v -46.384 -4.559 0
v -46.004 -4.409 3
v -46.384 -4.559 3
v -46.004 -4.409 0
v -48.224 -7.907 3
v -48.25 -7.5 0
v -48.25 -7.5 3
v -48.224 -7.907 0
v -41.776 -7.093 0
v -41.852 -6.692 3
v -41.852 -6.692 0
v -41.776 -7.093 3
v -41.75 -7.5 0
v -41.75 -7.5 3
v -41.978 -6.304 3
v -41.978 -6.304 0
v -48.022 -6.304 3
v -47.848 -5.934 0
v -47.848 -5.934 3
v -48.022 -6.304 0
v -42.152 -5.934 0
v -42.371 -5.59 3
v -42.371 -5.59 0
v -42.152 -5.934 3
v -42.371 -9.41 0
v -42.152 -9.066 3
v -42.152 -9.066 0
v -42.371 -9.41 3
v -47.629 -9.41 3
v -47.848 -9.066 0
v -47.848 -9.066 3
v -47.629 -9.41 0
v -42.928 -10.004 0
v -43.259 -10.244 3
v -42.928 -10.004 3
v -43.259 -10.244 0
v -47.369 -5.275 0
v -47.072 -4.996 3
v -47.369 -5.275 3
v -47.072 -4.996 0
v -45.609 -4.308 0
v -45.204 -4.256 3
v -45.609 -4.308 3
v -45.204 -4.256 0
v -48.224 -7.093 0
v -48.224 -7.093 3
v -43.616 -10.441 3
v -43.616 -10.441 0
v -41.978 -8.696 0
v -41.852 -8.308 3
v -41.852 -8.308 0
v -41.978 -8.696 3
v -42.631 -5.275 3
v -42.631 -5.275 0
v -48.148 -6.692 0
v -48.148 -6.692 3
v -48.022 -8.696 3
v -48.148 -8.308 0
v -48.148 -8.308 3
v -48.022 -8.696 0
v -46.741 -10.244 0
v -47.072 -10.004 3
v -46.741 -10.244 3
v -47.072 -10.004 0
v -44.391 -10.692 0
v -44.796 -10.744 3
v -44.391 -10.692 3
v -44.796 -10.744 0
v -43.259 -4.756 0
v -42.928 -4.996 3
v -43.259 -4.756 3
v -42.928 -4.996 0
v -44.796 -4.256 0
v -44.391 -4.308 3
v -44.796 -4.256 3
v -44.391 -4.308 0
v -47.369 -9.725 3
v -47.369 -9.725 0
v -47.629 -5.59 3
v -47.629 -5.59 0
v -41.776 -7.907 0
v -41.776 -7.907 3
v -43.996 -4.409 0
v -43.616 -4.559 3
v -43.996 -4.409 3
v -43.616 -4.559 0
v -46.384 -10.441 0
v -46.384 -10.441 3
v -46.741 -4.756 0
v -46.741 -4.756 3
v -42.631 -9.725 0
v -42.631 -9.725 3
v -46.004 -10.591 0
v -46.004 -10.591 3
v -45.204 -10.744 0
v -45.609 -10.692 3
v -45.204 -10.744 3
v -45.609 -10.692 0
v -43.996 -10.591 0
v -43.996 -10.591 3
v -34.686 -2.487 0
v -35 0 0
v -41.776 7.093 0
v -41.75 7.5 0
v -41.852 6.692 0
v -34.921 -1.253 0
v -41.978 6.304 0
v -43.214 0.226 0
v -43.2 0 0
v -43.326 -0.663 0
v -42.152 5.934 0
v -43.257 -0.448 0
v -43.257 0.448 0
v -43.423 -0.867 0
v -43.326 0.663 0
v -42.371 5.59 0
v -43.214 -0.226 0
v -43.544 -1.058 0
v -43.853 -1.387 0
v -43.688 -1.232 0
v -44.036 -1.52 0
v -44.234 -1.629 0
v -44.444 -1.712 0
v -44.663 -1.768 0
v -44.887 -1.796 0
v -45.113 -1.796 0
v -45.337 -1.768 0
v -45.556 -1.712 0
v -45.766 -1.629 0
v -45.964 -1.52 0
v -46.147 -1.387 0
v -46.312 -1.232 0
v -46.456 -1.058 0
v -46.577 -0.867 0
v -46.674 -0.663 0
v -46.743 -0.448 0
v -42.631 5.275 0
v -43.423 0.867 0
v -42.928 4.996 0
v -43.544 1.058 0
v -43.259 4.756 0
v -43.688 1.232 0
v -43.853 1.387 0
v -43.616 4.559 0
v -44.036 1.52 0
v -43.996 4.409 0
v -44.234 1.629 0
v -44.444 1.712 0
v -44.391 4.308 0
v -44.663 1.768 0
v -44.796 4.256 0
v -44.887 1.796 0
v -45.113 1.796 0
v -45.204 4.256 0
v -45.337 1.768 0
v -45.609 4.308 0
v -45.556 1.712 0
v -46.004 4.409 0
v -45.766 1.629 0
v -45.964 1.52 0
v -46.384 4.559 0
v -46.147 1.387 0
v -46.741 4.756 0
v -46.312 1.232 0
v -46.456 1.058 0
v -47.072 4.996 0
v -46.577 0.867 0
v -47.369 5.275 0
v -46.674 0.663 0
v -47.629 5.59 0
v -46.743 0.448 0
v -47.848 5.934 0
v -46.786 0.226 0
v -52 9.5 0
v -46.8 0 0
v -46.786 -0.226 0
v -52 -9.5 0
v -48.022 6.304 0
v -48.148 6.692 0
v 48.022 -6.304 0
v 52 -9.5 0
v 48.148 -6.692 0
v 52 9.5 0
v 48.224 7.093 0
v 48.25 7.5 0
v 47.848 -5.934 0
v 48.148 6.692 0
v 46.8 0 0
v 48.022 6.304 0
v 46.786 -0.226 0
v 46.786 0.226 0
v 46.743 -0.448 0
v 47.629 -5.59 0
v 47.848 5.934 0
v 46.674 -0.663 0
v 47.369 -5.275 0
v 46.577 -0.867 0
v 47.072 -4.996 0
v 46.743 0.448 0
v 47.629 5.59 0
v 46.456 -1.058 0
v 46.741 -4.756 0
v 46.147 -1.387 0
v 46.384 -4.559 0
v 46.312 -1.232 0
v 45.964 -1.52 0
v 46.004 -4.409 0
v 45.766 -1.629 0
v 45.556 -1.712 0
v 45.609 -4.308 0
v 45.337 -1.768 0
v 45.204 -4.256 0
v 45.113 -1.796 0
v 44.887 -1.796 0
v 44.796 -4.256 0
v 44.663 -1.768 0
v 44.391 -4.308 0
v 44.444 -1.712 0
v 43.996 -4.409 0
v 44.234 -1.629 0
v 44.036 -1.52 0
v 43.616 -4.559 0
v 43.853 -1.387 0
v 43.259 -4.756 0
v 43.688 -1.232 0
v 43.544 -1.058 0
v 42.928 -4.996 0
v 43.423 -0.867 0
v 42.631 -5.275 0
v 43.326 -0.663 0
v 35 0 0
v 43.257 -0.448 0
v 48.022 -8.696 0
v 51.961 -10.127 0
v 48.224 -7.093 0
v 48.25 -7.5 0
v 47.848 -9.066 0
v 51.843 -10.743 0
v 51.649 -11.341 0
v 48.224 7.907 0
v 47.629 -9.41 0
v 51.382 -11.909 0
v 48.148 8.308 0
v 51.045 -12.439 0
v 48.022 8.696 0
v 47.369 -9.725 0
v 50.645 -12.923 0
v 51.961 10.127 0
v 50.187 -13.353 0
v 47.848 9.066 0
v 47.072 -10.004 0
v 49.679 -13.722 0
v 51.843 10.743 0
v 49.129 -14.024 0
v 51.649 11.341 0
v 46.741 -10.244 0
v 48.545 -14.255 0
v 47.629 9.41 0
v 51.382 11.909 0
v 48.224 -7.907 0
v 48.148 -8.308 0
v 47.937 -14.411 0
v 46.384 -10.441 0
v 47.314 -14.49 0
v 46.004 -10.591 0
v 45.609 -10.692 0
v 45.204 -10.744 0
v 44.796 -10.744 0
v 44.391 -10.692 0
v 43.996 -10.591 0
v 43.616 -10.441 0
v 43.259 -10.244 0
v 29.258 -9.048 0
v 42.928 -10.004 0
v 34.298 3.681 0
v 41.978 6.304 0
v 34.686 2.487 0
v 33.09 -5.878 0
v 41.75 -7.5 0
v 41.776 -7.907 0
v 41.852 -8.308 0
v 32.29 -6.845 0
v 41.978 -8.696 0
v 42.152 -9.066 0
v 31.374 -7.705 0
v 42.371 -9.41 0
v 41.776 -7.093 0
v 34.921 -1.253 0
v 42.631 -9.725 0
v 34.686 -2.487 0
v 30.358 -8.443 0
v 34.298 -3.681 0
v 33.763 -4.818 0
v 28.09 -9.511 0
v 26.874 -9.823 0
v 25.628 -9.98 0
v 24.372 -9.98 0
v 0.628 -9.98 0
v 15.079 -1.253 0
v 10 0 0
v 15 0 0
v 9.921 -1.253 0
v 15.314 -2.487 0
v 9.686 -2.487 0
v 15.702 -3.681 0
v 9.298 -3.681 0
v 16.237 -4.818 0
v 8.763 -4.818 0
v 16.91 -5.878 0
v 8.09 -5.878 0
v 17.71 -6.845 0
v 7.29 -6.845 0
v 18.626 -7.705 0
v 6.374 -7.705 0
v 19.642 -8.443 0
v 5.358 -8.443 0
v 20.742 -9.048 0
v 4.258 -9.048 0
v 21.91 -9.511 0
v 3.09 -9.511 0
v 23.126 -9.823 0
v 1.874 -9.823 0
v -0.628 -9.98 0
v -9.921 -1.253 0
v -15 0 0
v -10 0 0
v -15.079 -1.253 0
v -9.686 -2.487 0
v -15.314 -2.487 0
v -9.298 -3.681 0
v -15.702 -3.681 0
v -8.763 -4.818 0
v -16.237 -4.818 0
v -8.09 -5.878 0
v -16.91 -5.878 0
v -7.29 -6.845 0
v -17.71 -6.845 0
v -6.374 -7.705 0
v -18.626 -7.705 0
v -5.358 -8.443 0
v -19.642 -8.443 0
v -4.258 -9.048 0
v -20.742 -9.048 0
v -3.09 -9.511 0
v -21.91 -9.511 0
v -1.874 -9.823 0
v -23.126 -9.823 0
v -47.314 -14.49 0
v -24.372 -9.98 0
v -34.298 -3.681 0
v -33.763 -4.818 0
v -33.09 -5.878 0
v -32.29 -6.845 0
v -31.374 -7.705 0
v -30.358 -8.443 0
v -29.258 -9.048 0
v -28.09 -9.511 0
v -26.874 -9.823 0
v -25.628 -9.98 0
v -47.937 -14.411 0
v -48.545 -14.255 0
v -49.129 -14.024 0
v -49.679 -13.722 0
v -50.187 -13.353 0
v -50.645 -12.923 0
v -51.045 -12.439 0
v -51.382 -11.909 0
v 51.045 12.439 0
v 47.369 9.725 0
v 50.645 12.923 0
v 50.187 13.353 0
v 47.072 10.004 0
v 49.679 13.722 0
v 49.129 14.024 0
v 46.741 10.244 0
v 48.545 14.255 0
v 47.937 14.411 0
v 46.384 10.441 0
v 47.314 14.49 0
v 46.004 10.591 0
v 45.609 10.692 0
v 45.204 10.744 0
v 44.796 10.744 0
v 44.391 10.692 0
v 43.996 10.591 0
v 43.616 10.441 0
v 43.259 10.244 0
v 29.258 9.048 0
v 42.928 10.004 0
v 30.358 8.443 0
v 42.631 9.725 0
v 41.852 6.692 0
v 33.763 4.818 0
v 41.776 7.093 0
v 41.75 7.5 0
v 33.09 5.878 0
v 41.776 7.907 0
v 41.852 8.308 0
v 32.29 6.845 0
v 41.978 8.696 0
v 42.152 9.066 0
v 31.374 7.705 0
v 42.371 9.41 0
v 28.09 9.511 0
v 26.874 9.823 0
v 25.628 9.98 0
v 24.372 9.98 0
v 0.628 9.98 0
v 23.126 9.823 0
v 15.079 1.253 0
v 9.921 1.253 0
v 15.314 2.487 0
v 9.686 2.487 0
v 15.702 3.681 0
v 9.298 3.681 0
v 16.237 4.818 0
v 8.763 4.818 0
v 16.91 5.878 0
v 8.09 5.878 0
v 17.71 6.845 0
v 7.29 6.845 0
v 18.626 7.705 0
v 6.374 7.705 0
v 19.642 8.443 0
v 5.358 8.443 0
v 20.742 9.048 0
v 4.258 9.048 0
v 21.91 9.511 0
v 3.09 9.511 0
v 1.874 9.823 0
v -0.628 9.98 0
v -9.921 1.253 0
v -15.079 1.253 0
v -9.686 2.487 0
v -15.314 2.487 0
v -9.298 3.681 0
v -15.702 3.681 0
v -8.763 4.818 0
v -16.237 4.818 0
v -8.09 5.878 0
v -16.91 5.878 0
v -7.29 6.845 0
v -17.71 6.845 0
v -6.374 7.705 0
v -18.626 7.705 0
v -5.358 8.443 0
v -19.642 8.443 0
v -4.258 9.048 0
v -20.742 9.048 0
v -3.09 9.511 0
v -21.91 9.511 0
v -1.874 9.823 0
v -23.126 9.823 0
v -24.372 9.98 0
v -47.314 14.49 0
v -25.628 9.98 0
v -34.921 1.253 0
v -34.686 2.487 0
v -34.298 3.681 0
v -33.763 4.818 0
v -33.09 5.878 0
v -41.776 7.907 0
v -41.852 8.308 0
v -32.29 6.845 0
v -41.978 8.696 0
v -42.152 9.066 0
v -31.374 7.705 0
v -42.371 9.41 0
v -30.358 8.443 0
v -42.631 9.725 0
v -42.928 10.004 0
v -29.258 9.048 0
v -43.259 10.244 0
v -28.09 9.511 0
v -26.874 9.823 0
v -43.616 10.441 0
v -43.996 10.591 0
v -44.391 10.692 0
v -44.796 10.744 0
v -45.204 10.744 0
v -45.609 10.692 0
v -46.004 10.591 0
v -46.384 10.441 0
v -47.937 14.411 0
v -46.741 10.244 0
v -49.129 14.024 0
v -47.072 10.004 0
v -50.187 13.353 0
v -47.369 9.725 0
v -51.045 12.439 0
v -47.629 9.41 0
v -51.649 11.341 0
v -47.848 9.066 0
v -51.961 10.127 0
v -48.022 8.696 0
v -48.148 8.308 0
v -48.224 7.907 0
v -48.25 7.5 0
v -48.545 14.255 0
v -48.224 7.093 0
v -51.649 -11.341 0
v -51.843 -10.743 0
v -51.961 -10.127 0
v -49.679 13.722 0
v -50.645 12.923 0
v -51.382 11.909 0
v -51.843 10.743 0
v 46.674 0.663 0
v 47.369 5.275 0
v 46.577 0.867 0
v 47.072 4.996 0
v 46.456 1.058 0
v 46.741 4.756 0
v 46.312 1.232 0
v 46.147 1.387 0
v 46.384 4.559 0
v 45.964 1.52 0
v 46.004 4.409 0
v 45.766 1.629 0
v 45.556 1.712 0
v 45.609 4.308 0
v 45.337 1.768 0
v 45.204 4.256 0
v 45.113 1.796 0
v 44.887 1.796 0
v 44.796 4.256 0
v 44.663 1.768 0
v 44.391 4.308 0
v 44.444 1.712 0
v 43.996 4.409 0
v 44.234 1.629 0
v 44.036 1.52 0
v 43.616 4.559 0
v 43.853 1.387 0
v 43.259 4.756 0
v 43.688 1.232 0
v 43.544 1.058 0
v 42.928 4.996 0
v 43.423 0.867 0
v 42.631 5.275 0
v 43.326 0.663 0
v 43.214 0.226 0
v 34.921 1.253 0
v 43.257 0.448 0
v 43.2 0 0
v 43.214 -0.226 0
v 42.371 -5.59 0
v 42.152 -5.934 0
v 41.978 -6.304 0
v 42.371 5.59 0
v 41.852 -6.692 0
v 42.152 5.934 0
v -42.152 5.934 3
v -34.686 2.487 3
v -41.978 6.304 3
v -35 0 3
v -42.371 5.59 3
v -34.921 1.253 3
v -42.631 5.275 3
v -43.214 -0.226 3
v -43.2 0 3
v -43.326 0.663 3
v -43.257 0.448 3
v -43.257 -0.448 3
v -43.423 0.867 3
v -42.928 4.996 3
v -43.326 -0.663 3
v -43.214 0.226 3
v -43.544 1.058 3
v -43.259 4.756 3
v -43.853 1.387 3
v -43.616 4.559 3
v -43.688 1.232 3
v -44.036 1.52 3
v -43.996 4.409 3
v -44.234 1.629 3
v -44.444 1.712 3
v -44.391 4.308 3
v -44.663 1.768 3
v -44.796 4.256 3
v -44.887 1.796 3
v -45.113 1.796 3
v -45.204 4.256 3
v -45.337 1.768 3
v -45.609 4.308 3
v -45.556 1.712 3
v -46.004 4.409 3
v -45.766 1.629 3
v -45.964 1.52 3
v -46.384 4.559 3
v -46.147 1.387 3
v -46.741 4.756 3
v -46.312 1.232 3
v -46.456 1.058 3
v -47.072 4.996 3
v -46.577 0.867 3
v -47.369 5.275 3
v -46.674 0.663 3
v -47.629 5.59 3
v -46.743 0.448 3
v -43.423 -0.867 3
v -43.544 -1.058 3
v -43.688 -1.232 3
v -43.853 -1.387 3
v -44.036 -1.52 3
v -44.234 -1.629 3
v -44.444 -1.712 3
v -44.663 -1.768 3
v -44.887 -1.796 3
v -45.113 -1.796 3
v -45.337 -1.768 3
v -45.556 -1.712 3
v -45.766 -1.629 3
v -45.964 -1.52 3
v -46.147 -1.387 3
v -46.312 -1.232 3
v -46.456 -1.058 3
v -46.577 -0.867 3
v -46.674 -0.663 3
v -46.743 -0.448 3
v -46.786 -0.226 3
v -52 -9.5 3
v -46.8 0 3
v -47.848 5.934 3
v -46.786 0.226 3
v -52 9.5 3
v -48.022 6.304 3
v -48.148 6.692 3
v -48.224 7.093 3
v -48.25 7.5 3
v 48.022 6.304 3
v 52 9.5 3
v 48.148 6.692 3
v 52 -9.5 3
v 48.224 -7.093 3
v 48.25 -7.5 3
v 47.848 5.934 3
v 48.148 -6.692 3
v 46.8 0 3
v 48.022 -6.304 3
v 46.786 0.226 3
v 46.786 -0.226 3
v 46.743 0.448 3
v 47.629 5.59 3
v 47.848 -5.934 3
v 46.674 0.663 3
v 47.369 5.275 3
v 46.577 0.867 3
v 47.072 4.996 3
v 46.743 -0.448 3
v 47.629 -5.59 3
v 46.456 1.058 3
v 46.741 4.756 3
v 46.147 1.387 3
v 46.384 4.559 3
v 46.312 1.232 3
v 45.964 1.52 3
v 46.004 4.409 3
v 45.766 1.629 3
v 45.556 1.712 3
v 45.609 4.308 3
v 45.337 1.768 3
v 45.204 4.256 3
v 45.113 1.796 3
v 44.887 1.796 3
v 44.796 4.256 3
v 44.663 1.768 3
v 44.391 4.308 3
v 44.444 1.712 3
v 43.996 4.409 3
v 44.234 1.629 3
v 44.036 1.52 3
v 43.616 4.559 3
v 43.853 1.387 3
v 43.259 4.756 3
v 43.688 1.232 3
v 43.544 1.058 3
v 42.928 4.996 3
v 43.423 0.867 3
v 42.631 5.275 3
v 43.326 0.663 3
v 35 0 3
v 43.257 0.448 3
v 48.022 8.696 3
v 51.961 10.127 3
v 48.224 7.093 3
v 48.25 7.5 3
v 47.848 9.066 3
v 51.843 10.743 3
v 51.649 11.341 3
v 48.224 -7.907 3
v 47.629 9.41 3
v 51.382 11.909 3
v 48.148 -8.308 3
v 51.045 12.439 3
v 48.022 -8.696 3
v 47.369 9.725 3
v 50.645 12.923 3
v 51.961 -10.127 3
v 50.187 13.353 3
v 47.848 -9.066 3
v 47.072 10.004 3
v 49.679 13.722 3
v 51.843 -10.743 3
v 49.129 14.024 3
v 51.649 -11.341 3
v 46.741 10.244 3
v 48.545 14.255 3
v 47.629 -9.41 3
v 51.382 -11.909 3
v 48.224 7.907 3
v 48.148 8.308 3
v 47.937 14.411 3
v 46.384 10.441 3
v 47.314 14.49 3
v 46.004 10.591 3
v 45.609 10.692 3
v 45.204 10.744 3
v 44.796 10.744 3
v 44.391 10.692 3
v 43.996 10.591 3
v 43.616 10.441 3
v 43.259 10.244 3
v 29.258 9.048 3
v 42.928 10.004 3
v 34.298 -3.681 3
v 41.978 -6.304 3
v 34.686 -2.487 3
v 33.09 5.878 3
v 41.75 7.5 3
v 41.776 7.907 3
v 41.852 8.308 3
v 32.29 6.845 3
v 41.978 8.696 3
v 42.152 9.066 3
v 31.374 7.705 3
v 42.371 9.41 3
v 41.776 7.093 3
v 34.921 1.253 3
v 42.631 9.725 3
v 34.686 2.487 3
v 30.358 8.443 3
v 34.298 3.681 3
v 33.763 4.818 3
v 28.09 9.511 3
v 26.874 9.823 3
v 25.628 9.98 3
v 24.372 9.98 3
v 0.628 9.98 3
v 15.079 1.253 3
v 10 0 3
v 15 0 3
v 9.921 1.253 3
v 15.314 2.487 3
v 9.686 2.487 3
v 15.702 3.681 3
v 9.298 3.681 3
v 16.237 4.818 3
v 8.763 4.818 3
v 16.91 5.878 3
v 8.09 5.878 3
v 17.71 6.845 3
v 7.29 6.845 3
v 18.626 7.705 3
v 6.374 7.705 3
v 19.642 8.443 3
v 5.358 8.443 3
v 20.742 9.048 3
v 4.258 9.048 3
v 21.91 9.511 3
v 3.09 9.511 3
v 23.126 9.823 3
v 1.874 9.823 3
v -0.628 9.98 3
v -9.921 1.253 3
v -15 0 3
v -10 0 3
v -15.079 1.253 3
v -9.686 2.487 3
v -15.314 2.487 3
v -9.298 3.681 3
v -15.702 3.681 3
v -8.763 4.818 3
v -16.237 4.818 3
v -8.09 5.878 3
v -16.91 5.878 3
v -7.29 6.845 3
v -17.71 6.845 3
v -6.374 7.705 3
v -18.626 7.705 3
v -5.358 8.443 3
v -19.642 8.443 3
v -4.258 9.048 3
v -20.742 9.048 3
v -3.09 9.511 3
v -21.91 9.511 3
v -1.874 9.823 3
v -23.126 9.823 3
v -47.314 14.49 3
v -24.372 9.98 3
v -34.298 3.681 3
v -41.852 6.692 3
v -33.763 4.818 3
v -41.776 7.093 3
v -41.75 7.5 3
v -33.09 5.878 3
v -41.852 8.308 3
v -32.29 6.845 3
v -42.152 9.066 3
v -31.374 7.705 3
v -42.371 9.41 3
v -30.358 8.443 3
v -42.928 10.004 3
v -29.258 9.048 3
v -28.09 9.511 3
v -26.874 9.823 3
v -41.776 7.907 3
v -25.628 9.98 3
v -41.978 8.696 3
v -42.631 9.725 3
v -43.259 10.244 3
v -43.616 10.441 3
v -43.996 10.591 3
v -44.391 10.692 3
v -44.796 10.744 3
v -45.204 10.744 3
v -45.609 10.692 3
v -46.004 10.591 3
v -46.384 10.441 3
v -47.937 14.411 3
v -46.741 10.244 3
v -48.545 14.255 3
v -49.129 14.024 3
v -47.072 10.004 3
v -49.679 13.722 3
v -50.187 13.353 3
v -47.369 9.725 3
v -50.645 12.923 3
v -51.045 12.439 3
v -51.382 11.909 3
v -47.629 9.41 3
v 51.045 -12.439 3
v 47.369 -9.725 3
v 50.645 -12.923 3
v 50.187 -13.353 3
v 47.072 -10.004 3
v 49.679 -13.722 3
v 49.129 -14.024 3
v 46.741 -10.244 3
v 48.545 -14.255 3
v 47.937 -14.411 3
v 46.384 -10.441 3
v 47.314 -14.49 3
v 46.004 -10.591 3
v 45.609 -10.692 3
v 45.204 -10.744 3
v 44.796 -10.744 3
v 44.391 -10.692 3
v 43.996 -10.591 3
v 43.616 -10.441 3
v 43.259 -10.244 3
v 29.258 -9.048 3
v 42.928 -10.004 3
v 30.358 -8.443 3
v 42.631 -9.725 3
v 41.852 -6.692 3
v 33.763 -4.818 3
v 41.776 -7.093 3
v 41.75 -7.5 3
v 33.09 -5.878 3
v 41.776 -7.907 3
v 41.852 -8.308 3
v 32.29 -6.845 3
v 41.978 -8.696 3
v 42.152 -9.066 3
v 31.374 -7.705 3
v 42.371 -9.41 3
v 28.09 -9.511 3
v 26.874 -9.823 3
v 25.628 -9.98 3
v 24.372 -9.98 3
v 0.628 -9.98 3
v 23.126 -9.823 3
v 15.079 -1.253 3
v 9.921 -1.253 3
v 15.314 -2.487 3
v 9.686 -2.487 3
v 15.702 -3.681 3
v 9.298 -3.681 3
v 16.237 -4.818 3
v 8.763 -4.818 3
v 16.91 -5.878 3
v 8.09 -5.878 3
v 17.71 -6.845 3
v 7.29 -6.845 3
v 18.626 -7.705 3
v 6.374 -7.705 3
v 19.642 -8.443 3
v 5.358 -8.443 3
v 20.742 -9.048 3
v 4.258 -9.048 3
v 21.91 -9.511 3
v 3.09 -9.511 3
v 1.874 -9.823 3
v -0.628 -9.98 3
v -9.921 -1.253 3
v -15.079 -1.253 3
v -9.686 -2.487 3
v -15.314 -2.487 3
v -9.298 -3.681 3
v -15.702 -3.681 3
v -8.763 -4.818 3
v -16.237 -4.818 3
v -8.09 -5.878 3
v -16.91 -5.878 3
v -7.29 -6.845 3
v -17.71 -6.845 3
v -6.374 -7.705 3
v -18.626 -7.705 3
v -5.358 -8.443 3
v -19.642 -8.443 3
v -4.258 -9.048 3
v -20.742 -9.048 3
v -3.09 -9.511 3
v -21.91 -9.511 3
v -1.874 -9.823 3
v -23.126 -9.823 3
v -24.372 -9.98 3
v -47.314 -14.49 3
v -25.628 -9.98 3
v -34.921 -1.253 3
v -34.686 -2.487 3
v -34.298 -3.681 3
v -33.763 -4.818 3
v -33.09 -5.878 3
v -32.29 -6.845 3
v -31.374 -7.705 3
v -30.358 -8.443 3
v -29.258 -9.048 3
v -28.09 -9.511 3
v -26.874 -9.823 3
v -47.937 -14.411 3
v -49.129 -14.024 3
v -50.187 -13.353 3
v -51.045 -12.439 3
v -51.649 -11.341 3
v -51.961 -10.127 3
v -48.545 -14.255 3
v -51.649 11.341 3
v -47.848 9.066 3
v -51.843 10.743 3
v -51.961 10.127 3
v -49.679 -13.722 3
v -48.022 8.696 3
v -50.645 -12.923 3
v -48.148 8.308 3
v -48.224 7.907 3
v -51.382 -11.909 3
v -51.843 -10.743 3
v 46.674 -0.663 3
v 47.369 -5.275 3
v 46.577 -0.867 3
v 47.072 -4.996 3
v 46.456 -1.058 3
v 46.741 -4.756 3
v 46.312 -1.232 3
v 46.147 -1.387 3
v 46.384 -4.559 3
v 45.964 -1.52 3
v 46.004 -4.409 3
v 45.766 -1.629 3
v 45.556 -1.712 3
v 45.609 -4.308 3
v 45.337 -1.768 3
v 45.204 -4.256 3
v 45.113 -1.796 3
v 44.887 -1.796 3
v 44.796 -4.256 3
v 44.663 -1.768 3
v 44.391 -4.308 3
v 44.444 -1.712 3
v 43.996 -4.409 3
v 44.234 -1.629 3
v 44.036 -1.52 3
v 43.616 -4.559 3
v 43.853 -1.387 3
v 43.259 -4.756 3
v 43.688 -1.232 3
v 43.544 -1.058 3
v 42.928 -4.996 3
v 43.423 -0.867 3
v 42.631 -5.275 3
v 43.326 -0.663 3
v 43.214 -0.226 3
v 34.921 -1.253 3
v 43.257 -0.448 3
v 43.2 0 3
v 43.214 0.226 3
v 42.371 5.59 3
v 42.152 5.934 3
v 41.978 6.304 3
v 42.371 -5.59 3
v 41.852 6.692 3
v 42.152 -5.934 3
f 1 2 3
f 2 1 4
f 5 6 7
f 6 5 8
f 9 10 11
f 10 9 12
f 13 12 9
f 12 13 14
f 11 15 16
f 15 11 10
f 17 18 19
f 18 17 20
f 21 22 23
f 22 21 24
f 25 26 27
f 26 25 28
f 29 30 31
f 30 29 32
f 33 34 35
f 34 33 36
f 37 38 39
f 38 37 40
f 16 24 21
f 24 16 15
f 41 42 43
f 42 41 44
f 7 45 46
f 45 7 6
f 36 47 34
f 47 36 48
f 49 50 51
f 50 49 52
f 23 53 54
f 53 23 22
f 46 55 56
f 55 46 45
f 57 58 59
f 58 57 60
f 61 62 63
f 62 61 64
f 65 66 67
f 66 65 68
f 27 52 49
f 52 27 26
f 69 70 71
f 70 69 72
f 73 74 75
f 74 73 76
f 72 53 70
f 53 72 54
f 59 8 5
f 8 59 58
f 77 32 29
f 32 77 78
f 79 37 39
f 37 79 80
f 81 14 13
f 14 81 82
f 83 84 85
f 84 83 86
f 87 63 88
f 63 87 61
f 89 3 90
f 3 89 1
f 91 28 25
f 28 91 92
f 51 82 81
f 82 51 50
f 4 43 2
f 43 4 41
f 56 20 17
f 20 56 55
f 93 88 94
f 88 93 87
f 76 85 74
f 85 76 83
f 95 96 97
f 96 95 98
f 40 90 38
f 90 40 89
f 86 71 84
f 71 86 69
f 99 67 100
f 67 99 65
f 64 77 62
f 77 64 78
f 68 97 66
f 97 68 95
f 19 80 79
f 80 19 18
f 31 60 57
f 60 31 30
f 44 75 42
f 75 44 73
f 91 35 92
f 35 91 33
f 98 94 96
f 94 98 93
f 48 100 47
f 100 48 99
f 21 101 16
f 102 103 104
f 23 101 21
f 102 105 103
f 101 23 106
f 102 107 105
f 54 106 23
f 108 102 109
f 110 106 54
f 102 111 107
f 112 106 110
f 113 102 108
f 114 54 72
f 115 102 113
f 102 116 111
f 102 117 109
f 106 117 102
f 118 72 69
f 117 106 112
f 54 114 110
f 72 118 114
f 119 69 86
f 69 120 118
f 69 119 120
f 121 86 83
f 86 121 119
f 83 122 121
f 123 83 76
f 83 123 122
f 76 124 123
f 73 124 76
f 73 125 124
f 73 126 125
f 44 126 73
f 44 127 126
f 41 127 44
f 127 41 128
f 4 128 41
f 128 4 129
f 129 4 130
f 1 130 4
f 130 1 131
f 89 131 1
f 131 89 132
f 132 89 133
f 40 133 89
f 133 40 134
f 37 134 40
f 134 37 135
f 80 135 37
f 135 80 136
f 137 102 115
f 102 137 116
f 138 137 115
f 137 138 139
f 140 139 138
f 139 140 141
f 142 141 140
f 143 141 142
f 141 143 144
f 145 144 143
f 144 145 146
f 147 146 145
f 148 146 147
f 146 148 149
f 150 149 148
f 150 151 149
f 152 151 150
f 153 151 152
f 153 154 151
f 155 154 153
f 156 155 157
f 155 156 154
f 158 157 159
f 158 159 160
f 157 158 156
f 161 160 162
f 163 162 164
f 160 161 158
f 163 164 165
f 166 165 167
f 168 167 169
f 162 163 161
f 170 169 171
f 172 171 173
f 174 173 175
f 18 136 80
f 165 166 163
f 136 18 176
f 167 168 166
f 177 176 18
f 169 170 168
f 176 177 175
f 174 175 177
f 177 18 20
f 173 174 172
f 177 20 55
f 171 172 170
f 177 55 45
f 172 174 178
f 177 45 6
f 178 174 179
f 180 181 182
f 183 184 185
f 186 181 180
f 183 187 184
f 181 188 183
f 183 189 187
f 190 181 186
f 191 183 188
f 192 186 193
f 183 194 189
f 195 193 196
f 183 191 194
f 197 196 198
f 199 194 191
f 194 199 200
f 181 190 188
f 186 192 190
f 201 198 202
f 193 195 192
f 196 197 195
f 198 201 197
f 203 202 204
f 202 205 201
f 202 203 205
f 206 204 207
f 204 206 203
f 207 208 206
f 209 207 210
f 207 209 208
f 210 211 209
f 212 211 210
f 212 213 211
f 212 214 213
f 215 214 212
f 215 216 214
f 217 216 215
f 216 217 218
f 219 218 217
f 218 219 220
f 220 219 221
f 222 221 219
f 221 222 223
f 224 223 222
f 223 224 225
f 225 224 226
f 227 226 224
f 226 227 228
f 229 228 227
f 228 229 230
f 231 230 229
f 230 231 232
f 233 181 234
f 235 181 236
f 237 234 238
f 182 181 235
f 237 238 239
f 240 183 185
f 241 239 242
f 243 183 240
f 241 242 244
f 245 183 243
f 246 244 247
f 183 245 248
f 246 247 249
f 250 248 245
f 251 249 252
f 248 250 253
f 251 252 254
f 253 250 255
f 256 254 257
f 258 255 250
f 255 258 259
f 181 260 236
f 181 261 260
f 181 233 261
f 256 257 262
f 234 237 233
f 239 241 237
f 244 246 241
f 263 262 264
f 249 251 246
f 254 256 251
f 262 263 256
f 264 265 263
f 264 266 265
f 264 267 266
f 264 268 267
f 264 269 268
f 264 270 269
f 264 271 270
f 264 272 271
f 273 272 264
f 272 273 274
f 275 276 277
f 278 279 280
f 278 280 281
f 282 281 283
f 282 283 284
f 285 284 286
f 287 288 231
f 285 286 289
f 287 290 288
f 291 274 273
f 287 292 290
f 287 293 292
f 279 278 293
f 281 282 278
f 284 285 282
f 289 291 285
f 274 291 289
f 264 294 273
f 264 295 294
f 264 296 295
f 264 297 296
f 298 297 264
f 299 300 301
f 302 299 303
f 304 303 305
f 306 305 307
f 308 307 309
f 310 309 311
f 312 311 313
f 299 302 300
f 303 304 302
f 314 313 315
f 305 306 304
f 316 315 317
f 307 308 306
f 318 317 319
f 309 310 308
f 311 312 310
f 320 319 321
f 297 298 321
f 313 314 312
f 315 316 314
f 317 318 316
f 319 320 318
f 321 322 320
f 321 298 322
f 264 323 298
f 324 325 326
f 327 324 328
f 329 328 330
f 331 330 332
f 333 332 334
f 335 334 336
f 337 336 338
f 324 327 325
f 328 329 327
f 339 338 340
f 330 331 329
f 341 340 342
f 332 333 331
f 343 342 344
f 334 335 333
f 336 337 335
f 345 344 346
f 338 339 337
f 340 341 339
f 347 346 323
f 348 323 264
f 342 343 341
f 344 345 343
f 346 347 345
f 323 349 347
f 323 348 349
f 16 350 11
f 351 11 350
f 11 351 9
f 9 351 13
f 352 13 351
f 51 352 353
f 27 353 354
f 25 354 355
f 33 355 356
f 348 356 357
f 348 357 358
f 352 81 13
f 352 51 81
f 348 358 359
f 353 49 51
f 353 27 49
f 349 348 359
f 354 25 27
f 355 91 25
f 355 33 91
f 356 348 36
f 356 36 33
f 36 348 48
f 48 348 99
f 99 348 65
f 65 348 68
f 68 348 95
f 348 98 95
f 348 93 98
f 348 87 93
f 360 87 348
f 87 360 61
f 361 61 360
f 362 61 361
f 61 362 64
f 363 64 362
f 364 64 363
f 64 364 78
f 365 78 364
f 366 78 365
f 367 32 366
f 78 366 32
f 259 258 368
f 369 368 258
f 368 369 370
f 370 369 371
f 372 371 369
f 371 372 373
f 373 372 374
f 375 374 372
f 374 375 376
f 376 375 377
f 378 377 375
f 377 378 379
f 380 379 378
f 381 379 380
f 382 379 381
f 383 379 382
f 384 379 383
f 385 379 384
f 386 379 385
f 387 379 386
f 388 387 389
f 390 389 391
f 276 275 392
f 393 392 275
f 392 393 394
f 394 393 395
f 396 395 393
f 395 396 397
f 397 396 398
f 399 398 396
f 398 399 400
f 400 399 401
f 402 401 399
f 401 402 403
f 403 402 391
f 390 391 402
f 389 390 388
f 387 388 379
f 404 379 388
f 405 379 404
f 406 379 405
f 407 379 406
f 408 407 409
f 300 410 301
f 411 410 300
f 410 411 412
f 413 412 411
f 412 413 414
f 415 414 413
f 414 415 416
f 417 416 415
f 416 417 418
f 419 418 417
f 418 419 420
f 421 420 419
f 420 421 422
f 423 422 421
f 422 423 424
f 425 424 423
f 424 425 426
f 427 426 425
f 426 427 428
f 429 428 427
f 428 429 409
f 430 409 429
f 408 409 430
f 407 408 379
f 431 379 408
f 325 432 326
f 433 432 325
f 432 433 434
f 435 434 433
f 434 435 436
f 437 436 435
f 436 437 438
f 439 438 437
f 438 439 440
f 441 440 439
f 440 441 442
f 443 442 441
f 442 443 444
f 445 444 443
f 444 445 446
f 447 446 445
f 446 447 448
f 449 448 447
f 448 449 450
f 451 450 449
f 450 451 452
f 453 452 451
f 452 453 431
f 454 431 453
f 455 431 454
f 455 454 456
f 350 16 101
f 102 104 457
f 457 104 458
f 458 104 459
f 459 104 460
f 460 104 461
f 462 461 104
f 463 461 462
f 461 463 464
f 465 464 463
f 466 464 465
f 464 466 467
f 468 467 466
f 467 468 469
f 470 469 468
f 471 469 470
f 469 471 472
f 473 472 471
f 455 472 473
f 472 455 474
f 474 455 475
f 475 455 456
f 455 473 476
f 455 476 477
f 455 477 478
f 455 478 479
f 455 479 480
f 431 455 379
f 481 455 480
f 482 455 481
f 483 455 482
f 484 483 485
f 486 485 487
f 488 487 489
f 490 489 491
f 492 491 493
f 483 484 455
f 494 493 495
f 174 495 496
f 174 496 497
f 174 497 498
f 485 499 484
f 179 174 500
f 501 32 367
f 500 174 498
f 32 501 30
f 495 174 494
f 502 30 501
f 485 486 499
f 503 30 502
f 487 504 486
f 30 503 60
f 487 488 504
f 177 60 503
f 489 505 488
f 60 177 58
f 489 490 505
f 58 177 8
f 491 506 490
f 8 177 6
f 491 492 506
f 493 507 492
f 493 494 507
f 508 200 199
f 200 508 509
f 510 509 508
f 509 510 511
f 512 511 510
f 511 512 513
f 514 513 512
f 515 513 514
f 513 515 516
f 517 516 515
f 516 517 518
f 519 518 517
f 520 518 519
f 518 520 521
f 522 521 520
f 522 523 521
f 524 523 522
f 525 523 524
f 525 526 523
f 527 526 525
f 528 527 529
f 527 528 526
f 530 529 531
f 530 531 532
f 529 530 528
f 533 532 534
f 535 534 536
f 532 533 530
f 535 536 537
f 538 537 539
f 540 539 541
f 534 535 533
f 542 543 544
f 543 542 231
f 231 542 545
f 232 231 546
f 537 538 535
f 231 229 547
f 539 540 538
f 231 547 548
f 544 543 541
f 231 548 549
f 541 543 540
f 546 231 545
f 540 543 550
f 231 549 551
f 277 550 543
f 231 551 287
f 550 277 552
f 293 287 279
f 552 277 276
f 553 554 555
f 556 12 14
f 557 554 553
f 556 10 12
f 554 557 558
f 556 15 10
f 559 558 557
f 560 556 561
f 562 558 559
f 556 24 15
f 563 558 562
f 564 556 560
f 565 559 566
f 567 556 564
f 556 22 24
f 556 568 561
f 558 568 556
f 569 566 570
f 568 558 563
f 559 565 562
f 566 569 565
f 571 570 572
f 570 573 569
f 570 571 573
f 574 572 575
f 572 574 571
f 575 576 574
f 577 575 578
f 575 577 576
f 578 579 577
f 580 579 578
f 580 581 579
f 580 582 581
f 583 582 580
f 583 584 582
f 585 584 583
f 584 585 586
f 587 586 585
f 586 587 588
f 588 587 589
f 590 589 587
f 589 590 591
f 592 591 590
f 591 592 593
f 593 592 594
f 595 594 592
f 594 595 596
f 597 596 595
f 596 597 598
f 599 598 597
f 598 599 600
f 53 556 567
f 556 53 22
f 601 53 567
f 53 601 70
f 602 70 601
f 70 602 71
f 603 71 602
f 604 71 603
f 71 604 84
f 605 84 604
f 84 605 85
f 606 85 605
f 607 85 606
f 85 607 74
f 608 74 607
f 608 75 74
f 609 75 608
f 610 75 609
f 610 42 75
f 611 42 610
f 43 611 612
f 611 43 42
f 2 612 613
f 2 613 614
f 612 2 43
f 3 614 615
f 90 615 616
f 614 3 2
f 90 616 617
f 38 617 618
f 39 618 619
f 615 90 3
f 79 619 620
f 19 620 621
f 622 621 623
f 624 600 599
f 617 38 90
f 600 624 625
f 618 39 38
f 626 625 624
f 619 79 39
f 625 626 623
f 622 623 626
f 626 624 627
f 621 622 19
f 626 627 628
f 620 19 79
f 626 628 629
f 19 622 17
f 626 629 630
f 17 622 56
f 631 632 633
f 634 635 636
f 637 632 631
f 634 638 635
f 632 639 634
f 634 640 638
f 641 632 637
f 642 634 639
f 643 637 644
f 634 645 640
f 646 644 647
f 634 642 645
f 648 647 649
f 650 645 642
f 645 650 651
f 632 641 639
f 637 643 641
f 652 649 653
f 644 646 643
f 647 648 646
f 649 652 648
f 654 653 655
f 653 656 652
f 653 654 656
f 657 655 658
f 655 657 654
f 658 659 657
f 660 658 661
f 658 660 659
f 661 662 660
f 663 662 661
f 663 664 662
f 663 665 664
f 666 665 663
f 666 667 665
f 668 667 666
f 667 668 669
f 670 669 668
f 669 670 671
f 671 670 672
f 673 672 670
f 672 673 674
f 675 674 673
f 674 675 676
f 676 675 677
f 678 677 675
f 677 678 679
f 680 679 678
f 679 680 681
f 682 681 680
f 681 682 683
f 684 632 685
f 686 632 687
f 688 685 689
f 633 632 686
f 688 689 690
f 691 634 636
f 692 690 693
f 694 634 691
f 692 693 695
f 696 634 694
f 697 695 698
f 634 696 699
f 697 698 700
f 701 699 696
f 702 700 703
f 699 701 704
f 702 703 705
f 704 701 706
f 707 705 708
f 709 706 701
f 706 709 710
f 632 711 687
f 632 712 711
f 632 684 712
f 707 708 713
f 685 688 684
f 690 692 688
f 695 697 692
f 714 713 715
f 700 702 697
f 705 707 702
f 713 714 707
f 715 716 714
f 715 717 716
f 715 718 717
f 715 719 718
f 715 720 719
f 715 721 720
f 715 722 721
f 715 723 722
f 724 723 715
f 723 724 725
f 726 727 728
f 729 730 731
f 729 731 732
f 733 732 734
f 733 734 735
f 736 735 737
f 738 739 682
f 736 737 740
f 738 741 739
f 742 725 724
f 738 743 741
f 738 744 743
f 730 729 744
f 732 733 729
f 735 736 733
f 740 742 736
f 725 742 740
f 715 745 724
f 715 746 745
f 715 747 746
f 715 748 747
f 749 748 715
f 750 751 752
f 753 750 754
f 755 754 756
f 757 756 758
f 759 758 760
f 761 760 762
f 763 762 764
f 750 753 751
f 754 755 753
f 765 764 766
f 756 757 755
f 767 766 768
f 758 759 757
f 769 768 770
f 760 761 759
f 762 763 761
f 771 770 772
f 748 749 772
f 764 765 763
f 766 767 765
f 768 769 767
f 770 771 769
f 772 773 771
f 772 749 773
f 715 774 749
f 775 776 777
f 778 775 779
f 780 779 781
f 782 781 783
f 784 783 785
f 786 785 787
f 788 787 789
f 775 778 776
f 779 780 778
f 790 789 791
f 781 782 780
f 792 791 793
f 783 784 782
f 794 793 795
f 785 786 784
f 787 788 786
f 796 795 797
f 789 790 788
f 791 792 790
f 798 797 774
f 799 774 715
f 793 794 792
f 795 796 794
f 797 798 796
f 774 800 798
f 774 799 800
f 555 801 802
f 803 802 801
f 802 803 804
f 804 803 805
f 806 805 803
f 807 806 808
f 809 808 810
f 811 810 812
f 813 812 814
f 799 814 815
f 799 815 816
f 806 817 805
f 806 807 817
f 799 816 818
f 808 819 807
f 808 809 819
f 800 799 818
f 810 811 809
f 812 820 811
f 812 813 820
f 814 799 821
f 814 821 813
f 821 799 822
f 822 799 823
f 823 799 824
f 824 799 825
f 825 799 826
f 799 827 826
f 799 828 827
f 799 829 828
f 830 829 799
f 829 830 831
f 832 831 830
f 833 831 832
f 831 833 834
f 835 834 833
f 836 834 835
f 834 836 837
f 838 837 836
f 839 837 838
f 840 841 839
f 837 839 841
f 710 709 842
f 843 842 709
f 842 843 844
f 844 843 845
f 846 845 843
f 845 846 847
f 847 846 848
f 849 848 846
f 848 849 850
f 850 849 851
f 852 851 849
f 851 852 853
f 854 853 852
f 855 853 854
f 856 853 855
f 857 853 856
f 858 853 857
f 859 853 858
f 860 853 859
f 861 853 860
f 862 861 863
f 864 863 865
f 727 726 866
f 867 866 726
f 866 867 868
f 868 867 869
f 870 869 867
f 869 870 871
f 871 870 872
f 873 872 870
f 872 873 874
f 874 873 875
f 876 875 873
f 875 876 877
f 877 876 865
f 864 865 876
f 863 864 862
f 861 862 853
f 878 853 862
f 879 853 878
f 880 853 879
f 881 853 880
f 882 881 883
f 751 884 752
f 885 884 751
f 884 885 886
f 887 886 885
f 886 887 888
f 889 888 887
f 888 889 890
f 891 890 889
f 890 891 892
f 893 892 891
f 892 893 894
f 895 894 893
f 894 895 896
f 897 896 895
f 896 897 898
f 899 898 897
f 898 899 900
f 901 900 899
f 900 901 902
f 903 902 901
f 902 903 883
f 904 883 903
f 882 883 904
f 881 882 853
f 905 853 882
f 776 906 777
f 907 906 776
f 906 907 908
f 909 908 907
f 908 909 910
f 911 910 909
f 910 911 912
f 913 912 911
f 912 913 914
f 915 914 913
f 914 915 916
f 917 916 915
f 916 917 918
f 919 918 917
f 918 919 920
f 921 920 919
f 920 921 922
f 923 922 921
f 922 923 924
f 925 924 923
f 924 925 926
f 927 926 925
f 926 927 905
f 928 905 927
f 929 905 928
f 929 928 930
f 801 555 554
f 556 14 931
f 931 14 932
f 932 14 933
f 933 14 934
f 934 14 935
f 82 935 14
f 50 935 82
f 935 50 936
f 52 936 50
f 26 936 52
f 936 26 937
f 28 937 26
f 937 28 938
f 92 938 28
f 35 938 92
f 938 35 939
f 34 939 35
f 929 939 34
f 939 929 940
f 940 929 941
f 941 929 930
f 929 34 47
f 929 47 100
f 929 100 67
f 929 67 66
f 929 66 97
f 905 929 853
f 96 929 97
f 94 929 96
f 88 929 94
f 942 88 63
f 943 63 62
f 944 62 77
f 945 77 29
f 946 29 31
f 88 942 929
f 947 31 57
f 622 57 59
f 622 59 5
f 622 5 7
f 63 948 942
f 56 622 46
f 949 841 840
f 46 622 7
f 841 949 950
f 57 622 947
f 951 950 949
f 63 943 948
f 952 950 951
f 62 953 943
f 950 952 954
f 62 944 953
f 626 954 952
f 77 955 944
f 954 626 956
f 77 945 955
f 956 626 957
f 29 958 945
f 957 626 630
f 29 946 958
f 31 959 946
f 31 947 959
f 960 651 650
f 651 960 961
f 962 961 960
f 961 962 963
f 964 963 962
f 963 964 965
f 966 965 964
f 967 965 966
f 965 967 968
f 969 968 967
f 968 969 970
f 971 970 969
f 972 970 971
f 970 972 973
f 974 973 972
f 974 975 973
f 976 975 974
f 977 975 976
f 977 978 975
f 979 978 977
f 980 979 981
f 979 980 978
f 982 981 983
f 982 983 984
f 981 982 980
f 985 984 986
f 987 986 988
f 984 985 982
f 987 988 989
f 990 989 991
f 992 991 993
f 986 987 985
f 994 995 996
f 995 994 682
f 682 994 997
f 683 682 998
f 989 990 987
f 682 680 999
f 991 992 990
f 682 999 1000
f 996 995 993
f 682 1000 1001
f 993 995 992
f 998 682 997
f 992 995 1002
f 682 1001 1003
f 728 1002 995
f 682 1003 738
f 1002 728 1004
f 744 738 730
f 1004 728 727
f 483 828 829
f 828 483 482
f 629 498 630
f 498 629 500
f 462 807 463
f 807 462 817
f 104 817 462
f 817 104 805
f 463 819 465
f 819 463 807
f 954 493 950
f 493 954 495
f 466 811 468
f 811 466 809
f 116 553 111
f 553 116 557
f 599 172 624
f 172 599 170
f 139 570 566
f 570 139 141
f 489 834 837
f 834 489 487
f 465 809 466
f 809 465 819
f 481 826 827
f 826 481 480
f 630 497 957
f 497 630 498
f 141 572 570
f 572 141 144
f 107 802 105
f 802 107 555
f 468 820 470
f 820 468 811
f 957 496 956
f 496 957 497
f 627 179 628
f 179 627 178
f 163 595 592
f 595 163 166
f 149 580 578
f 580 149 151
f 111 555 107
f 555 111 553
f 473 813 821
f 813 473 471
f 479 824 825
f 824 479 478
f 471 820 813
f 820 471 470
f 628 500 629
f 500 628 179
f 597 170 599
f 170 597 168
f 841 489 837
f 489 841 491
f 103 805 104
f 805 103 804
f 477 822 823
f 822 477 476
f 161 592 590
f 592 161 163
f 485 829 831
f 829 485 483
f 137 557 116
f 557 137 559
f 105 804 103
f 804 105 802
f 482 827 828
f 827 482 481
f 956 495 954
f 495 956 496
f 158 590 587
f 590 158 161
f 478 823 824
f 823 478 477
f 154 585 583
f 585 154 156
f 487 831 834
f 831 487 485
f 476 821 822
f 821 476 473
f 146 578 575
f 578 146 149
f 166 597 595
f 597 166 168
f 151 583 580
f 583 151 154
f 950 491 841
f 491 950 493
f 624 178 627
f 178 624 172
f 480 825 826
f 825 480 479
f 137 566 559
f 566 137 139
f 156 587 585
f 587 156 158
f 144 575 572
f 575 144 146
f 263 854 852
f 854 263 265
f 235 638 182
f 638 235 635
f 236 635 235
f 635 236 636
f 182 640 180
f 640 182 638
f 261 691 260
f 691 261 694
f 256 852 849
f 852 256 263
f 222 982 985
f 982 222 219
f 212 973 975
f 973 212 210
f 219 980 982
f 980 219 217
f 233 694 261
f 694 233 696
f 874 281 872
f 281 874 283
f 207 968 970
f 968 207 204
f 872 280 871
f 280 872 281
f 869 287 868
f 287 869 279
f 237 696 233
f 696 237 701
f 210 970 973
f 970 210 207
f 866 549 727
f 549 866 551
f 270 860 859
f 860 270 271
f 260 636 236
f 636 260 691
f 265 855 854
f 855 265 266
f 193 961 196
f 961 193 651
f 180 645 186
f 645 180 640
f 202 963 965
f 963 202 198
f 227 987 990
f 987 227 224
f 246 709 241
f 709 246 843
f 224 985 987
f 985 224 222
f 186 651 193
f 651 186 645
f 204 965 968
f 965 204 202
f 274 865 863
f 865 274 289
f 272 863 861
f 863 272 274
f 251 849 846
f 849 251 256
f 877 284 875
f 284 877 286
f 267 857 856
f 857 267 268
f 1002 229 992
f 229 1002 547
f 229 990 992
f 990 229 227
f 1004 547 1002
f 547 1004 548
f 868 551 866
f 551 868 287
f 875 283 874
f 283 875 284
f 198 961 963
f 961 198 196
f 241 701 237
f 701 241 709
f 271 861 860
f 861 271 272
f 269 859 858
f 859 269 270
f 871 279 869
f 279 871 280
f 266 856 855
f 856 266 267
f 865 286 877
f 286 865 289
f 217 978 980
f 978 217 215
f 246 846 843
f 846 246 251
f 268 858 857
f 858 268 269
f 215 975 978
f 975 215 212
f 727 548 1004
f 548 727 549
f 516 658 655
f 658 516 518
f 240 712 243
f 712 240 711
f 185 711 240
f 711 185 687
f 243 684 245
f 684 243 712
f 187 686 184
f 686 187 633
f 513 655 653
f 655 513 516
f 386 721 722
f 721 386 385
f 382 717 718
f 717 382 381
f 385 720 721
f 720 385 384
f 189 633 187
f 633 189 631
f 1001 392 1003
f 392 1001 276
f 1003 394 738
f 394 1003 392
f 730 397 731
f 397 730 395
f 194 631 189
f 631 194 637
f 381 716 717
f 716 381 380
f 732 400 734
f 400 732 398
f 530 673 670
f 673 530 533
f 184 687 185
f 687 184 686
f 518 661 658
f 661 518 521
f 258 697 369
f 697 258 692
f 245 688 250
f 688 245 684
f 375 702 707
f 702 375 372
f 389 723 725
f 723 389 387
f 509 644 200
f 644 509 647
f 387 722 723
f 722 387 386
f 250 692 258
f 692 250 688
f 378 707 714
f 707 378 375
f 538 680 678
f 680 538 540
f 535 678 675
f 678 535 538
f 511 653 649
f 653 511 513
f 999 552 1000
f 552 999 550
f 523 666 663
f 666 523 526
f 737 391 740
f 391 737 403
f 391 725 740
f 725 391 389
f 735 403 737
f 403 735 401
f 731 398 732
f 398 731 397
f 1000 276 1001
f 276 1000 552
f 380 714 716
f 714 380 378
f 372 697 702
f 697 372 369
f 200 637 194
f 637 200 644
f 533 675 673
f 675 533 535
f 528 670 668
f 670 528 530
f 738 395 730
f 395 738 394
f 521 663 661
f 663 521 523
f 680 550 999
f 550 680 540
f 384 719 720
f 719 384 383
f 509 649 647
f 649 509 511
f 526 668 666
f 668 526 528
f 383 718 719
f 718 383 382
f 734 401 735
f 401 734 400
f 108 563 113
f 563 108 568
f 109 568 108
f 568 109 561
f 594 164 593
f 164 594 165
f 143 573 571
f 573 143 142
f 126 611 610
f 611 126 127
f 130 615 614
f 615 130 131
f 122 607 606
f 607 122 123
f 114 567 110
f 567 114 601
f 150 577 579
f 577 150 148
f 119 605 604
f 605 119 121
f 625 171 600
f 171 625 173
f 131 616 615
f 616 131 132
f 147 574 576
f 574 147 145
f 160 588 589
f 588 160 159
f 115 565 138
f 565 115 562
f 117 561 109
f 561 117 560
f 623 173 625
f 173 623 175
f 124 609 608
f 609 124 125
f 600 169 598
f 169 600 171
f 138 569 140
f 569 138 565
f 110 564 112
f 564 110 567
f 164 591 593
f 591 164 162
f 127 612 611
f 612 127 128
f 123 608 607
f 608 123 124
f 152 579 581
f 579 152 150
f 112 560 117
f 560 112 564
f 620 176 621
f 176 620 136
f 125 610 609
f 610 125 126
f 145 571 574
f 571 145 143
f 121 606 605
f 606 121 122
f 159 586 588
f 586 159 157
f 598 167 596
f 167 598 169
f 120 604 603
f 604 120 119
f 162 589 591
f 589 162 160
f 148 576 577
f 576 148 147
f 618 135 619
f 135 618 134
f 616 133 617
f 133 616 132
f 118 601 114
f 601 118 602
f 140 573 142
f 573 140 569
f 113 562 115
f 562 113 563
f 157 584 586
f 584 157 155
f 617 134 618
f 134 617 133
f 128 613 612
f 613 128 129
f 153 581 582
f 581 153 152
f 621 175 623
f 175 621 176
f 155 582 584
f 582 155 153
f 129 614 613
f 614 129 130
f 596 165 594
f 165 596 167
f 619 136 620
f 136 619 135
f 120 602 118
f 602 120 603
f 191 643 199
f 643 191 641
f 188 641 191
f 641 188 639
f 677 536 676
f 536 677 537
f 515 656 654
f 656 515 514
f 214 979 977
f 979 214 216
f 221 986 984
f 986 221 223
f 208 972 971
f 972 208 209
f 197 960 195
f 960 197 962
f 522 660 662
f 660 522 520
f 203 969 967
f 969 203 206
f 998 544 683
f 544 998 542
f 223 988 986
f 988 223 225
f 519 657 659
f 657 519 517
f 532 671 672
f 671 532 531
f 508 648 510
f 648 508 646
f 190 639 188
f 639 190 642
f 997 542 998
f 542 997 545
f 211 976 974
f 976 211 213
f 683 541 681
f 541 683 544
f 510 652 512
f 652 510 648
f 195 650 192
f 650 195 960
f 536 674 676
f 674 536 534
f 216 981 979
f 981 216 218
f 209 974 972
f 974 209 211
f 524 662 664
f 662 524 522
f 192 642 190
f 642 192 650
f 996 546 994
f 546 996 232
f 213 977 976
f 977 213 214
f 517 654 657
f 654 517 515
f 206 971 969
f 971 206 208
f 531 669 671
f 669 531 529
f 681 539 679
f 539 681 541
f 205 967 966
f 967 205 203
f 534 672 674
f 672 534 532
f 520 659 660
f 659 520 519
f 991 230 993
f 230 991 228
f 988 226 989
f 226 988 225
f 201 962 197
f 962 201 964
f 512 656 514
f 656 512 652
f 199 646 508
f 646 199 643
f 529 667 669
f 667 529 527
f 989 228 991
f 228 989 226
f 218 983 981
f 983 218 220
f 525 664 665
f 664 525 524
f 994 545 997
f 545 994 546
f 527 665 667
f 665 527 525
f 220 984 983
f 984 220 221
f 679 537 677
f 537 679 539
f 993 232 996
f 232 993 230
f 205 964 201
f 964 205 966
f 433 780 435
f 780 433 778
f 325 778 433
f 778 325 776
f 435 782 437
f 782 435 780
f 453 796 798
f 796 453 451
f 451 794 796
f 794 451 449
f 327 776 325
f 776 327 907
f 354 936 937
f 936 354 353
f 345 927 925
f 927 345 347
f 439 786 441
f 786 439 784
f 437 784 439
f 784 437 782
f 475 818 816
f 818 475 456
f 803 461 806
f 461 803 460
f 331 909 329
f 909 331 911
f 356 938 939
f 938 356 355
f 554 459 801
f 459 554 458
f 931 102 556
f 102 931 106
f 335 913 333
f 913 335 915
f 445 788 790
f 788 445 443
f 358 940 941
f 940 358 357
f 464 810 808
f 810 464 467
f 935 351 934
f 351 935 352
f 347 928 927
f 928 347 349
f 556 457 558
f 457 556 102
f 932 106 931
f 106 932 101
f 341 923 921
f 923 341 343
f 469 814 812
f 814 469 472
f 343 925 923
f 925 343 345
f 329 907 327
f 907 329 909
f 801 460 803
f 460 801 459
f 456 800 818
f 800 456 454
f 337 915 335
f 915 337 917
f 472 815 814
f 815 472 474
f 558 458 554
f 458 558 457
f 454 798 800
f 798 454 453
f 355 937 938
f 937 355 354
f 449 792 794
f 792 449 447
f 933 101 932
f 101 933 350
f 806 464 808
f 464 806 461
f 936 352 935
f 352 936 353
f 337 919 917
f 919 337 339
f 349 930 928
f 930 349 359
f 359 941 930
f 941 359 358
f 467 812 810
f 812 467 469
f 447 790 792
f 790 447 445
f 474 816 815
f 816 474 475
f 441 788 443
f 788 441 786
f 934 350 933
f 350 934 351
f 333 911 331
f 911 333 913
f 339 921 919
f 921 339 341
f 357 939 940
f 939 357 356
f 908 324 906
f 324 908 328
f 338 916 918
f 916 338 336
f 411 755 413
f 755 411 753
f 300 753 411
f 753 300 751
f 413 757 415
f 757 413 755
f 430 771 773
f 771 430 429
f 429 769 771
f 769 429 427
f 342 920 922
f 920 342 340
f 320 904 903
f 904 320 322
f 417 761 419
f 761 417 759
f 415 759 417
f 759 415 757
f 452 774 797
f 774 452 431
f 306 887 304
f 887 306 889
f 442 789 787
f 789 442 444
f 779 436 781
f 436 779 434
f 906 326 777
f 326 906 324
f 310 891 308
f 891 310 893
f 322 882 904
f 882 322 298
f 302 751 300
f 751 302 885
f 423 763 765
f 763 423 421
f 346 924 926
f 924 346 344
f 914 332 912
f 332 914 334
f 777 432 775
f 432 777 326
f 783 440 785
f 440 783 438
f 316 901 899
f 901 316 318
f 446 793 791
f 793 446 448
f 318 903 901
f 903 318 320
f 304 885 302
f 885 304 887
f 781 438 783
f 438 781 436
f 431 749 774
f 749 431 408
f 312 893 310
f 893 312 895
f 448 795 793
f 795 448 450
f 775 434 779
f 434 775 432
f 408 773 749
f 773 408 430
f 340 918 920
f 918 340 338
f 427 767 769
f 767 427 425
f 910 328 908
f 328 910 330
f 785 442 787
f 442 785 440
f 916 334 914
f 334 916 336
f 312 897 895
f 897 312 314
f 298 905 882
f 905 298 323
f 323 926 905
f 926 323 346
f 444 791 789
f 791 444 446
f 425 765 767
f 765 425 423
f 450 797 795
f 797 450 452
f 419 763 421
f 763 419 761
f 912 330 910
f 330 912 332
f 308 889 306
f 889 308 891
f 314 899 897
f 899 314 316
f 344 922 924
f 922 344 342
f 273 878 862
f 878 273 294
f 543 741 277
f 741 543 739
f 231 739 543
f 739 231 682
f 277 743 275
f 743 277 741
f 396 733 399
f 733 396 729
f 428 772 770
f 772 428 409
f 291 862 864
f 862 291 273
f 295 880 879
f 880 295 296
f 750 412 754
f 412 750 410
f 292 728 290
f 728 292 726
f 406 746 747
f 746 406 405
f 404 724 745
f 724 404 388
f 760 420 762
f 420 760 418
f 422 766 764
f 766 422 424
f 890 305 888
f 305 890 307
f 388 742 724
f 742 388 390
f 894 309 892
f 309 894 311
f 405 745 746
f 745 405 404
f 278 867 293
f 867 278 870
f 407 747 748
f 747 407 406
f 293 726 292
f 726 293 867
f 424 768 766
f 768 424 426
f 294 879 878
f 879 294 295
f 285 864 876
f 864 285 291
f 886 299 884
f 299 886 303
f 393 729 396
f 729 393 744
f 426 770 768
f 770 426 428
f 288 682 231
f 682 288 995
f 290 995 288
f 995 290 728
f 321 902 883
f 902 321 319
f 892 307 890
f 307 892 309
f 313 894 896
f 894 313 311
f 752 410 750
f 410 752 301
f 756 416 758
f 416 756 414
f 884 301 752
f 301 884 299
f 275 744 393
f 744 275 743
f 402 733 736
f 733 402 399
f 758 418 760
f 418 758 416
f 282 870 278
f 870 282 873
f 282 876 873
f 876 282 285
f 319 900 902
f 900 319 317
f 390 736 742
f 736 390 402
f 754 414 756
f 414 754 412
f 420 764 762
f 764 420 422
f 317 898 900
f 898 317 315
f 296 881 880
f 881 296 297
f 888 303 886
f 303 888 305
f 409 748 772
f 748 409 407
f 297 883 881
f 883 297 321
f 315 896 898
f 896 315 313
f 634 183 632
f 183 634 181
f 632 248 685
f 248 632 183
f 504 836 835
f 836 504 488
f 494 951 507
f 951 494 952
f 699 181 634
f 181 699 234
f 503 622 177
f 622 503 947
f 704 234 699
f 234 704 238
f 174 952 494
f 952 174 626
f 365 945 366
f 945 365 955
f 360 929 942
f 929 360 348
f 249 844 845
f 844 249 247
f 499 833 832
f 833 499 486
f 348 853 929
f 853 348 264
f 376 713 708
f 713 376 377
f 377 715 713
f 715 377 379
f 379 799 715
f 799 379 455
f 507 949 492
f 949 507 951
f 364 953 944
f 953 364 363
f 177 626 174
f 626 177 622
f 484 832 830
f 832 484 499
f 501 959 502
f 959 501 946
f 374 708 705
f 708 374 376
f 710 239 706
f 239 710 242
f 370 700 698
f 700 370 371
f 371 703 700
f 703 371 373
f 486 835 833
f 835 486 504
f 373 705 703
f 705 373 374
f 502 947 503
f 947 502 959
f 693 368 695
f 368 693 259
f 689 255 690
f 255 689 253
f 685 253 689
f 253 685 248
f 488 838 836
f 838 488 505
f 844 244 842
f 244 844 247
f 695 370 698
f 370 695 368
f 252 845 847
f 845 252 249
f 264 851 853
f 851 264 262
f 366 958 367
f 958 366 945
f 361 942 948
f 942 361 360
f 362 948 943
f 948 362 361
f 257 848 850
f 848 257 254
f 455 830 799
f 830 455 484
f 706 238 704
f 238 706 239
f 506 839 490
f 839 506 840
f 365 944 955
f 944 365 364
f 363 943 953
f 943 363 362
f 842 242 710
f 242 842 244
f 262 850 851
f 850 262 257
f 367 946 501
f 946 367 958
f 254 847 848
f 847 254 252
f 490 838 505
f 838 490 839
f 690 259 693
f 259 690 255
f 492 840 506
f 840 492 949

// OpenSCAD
$fn = 50;

difference() {
	union() {
		hull() {
			translate(v = [-47.0, 9.5, 0]) {
				cylinder(h = 3, r = 5);
			}
			translate(v = [47.0, 9.5, 0]) {
				cylinder(h = 3, r = 5);
			}
			translate(v = [-47.0, -9.5, 0]) {
				cylinder(h = 3, r = 5);
			}
			translate(v = [47.0, -9.5, 0]) {
				cylinder(h = 3, r = 5);
			}
		}
	}
	union() {
		translate(v = [-45.0, -7.5, 0]) {
			cylinder(h = 3, r = 3.25);
		}
		translate(v = [-45.0, 7.5, 0]) {
			cylinder(h = 3, r = 3.25);
		}
		translate(v = [45.0, -7.5, 0]) {
			cylinder(h = 3, r = 3.25);
		}
		translate(v = [45.0, 7.5, 0]) {
			cylinder(h = 3, r = 3.25);
		}
		translate(v = [-45.0, 0.0, 0]) {
			cylinder(h = 3, r = 1.8);
		}
		translate(v = [45.0, 0.0, 0]) {
			cylinder(h = 3, r = 1.8);
		}
		translate(v = [-25.0, 0, 0.0]) {
			cylinder(h = 3, r = 10.0);
		}
		cylinder(h = 3, r = 10.0);
		translate(v = [25.0, 0, 0.0]) {
			cylinder(h = 3, r = 10.0);
		}
	}
}
